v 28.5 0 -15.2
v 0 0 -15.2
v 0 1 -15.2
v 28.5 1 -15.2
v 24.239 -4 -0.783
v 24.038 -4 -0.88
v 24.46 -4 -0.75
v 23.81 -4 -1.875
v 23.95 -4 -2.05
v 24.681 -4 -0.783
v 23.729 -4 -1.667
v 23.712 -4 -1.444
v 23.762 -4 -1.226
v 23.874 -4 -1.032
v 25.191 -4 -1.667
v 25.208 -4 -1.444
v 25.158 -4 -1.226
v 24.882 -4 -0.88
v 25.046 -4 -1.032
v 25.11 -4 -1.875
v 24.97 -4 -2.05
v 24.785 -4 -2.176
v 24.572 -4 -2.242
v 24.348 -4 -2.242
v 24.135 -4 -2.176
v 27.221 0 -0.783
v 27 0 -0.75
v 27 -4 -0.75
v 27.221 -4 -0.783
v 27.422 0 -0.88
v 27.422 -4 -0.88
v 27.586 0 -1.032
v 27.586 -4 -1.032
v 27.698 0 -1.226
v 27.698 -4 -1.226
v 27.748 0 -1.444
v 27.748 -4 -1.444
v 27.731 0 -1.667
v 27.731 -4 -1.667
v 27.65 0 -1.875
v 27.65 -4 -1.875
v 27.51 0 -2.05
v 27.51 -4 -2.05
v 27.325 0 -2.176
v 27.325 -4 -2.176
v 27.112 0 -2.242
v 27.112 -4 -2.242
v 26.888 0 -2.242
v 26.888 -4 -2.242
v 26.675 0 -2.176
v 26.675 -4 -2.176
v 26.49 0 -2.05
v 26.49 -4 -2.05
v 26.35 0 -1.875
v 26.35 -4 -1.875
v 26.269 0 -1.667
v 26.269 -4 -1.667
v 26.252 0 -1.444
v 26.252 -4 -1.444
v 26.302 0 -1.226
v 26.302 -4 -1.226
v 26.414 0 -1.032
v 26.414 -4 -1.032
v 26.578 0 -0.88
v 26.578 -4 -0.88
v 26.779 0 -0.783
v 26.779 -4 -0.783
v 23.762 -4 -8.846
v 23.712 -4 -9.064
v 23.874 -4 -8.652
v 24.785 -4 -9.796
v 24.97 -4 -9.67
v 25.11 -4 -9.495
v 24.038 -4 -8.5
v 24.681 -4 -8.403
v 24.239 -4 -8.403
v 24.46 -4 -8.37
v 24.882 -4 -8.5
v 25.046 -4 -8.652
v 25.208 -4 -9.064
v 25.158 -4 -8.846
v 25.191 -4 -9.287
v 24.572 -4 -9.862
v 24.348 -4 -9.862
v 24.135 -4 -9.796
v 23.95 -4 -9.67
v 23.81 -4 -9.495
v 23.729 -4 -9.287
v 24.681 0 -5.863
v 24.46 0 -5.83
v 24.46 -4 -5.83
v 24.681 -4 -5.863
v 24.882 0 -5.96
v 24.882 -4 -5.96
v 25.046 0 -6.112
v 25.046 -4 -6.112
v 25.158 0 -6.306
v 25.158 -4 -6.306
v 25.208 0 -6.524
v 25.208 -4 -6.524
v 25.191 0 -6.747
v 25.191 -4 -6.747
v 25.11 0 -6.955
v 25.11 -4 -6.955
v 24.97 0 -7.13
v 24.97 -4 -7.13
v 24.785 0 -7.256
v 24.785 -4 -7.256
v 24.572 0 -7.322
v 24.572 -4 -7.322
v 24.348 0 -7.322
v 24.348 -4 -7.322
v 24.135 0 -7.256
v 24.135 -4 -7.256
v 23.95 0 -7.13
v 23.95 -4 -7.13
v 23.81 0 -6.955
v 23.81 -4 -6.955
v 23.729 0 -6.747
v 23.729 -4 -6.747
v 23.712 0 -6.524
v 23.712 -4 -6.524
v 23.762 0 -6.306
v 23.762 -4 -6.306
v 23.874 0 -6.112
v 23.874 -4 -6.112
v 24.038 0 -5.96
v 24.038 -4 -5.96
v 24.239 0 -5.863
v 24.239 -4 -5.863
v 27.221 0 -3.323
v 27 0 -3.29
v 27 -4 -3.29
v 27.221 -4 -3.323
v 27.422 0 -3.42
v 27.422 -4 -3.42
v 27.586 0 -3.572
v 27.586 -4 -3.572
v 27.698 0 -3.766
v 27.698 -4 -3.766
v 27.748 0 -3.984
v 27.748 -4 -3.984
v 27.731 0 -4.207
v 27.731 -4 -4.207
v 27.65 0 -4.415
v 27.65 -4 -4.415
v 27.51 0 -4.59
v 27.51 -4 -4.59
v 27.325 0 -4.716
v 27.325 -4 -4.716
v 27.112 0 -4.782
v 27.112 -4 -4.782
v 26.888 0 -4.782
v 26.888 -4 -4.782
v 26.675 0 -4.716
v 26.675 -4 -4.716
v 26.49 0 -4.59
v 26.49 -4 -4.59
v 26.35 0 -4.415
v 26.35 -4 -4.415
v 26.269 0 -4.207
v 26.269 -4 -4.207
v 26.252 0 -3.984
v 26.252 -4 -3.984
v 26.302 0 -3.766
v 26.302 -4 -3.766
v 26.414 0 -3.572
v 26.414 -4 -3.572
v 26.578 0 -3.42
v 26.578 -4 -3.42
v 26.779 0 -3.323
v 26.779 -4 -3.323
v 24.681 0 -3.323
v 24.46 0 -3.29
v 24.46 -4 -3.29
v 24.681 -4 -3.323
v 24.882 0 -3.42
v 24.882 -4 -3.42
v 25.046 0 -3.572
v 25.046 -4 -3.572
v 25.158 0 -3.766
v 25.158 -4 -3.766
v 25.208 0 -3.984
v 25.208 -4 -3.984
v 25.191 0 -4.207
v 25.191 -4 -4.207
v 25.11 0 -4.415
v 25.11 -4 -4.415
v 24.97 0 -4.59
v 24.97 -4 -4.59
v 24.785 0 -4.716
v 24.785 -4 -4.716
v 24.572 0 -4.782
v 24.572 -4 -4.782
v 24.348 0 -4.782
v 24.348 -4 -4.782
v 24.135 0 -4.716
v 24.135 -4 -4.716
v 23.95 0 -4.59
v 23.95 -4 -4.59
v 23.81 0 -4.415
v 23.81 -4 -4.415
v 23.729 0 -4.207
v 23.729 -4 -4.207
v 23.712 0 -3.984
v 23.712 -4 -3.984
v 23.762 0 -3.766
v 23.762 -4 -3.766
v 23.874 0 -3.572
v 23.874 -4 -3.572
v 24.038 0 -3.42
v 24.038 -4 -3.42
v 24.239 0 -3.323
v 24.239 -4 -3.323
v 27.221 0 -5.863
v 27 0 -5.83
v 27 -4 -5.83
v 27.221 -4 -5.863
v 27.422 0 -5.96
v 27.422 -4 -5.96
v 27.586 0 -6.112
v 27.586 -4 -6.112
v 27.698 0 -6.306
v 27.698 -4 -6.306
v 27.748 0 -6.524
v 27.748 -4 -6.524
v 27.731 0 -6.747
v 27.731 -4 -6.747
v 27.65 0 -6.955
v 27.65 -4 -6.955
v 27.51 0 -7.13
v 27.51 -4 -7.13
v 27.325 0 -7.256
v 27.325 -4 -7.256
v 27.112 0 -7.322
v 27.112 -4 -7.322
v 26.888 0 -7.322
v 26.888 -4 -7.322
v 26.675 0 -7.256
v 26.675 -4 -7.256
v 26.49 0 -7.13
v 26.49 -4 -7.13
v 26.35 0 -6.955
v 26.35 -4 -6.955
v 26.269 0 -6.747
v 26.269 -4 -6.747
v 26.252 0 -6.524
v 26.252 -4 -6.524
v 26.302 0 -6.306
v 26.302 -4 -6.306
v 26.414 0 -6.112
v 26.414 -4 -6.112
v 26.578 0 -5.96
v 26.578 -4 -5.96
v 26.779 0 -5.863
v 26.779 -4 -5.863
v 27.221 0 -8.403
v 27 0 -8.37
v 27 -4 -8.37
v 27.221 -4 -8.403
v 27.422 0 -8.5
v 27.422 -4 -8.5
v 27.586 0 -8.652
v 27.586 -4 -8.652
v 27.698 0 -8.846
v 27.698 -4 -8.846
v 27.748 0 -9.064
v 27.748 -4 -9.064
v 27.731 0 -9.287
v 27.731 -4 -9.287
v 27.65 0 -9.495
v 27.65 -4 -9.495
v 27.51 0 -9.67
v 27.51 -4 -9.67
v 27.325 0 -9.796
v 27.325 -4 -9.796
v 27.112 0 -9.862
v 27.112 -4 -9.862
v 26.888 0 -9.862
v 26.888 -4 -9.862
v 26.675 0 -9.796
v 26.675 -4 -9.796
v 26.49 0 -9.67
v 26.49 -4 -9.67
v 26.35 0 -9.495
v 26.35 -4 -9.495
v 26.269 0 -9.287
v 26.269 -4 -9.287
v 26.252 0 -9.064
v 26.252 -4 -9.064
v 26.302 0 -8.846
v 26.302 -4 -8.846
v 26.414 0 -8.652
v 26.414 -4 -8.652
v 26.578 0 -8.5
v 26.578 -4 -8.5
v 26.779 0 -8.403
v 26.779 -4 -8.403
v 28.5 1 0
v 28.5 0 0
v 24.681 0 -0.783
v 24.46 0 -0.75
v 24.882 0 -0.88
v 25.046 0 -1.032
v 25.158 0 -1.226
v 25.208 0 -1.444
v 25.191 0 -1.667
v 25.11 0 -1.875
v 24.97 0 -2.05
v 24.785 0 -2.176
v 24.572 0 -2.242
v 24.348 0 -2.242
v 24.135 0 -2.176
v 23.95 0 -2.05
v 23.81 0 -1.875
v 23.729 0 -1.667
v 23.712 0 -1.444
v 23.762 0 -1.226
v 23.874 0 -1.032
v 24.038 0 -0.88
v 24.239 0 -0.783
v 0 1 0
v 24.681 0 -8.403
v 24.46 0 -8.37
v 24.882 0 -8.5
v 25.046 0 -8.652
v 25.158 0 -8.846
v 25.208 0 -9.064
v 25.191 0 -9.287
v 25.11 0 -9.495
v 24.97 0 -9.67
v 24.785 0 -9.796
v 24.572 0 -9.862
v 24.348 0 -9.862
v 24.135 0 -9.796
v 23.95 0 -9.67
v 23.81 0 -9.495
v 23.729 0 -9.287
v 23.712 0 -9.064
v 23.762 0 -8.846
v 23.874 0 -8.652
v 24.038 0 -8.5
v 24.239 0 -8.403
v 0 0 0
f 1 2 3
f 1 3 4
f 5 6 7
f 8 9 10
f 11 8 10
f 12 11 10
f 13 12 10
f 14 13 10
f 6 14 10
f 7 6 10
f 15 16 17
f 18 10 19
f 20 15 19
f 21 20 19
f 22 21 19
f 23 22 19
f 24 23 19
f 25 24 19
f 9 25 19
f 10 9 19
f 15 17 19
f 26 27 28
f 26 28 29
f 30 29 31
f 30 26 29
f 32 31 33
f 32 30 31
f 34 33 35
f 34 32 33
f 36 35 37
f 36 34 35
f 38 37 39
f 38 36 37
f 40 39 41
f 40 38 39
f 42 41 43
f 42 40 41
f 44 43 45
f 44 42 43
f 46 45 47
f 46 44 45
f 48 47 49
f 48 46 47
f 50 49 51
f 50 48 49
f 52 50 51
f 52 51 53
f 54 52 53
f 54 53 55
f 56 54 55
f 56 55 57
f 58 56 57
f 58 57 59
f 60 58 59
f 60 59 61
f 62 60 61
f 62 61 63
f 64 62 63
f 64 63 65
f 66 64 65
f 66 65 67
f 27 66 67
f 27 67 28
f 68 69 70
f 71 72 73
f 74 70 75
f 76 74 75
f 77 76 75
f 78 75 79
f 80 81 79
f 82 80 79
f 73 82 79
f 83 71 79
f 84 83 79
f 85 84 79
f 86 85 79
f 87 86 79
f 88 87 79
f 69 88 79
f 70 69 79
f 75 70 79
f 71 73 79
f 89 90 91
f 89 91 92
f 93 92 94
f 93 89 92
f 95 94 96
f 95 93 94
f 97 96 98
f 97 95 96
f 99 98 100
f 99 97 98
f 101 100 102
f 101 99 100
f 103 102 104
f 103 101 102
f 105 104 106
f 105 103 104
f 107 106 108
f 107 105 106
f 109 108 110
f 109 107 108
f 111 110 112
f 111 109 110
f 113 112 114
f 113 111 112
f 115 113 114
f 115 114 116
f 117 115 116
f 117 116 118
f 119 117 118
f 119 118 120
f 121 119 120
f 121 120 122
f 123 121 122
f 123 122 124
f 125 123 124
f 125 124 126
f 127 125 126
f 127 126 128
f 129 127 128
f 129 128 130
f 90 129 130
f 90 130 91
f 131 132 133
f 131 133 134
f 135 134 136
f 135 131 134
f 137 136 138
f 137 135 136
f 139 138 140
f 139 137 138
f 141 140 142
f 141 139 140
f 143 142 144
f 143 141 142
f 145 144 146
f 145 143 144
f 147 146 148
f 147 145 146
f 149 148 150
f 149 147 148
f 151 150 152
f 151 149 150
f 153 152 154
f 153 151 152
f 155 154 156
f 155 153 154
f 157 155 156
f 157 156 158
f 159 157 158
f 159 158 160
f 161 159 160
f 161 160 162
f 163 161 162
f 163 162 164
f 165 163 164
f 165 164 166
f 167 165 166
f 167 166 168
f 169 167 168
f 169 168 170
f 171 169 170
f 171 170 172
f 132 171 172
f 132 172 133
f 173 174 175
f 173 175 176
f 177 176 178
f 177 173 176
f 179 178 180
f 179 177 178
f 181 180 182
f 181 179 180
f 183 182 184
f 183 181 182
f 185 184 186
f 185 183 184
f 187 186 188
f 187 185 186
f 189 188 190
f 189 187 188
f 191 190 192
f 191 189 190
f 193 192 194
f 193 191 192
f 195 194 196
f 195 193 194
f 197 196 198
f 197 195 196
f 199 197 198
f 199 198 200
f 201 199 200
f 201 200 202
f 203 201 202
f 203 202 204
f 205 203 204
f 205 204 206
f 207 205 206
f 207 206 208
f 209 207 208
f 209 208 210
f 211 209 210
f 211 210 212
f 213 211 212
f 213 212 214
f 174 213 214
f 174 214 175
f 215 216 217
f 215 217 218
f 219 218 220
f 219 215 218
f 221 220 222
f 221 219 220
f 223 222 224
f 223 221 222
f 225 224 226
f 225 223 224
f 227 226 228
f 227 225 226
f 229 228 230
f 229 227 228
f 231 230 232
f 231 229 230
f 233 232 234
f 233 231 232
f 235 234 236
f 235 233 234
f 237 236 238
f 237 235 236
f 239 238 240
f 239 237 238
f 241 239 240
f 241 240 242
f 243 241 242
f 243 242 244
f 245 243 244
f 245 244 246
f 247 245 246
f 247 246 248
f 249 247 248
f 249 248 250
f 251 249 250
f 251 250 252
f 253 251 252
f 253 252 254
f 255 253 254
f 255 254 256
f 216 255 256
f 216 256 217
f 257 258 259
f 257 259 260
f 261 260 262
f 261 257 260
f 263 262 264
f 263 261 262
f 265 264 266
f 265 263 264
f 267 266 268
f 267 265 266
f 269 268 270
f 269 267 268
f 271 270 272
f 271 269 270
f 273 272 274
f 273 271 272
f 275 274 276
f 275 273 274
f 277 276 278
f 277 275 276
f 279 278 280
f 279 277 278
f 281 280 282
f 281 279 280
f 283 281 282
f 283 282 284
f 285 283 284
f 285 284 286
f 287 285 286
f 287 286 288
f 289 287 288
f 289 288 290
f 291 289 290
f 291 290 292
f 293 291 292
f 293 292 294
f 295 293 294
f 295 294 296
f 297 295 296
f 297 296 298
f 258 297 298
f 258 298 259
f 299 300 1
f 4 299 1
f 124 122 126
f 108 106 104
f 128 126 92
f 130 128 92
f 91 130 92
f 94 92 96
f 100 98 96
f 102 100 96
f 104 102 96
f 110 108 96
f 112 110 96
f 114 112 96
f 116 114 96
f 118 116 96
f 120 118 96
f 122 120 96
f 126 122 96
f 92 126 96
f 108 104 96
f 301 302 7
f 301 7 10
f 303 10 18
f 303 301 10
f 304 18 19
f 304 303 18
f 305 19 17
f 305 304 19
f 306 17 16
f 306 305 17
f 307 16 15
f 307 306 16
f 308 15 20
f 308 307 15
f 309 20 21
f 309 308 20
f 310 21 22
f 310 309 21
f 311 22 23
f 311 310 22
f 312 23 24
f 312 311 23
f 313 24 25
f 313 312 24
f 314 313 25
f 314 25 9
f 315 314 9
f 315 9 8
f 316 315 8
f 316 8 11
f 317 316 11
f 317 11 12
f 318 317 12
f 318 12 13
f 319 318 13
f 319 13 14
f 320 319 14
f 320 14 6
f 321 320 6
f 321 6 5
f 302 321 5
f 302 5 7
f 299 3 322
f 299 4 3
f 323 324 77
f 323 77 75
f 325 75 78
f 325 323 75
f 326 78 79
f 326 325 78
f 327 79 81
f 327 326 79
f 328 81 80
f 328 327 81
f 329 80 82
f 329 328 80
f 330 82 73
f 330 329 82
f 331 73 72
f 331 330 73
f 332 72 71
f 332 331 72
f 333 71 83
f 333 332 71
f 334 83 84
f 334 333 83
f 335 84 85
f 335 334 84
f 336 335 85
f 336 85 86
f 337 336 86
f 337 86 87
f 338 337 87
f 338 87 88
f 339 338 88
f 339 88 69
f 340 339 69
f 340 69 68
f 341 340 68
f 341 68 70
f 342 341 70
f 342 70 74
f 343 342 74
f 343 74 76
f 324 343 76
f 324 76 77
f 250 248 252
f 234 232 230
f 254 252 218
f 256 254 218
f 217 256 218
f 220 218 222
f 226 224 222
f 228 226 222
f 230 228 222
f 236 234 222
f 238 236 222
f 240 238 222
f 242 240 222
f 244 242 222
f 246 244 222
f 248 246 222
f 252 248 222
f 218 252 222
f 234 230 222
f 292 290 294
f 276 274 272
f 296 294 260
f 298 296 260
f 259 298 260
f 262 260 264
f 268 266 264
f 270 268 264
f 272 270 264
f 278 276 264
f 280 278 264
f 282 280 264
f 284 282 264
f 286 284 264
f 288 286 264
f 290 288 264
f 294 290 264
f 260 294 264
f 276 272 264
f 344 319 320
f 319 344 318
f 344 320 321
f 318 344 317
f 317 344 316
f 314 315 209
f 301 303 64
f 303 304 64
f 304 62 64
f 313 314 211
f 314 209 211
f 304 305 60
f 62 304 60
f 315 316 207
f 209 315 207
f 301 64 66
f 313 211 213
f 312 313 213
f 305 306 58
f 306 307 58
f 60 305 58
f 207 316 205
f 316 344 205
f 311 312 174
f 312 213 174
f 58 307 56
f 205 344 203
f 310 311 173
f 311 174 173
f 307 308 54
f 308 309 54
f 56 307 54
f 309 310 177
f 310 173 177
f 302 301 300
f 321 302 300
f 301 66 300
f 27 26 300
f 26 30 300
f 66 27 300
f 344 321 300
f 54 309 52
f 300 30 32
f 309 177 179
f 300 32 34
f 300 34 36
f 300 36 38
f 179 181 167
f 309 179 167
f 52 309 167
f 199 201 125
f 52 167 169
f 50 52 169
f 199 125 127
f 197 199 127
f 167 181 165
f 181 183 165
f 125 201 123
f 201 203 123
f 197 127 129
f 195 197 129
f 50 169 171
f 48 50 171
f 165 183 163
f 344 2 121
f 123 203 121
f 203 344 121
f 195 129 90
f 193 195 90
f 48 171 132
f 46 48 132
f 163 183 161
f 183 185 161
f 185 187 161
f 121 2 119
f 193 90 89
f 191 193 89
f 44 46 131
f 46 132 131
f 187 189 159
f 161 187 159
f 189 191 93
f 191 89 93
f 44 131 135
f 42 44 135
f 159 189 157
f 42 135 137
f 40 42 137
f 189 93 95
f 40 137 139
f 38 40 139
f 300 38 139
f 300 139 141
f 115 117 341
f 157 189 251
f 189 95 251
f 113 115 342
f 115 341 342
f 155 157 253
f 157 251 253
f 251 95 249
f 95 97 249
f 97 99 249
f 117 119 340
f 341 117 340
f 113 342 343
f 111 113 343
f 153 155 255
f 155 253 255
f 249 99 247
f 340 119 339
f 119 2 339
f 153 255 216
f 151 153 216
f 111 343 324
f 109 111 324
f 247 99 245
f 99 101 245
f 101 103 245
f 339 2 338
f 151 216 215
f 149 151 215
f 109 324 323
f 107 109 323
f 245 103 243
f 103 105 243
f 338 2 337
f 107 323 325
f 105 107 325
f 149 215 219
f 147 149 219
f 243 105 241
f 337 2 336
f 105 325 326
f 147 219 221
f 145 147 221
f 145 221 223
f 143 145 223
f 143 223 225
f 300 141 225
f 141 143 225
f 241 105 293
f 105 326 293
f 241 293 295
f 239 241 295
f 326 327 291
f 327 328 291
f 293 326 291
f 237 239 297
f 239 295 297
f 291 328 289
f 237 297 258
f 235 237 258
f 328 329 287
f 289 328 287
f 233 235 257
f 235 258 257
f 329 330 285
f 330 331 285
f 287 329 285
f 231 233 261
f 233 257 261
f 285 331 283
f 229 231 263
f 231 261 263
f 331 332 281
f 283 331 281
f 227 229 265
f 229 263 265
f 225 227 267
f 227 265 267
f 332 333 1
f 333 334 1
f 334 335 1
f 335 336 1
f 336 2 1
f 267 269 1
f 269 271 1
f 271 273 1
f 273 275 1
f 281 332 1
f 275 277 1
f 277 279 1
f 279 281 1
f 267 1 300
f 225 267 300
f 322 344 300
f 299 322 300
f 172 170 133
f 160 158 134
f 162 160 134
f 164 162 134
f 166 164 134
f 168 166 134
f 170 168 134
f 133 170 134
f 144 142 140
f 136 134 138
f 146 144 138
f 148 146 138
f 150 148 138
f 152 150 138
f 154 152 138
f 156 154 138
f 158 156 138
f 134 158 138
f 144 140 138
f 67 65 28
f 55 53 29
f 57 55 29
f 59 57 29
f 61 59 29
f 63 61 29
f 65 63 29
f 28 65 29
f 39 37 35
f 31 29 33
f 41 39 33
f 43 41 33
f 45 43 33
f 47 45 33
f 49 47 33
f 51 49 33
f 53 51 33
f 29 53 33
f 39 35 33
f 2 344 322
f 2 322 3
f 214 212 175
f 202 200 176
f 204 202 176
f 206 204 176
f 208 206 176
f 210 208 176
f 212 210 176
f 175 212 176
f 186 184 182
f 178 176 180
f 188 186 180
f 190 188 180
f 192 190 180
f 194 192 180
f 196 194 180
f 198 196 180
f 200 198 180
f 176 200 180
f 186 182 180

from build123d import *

# Parameters (mm, degrees)
SKETCH1_W           = 28.5
SKETCH1_H           = 15.2
BOSS_EXTRUDE1_DEPTH = 1
SKETCH5_R           = 0.75
BOSS_EXTRUDE4_DEPTH = 5


with BuildPart() as part:
    # Sketch1 → Boss-Extrude1 (new body)
    with BuildSketch(Plane(origin=(0, 0, 0), x_dir=(1, 0, 0), z_dir=(0, 1, 0))):
        with Locations((14.25, 7.6)):
            Rectangle(SKETCH1_W, SKETCH1_H)
    extrude(amount=BOSS_EXTRUDE1_DEPTH)

    # Sketch5 → Boss-Extrude4 (add)
    with BuildSketch(Plane(origin=(0, 1, 0), x_dir=(1, 0, 0), z_dir=(0, 1, 0))):
        with Locations(Location((27, 1.5, 0), (0, 0, 270))):
            Circle(SKETCH5_R)
        with Locations(Location((24.46, 1.5, 0), (0, 0, 270))):
            Circle(SKETCH5_R)
        with Locations(Location((24.46, 4.04, 0), (0, 0, 270))):
            Circle(SKETCH5_R)
        with Locations(Location((27, 4.04, 0), (0, 0, 270))):
            Circle(SKETCH5_R)
        with Locations(Location((24.46, 6.58, 0), (0, 0, 270))):
            Circle(SKETCH5_R)
        with Locations(Location((27, 6.58, 0), (0, 0, 270))):
            Circle(SKETCH5_R)
        with Locations(Location((24.46, 9.12, 0), (0, 0, 270))):
            Circle(SKETCH5_R)
        with Locations(Location((27, 9.12, 0), (0, 0, 270))):
            Circle(SKETCH5_R)
    extrude(amount=-BOSS_EXTRUDE4_DEPTH)


solid = part.part
